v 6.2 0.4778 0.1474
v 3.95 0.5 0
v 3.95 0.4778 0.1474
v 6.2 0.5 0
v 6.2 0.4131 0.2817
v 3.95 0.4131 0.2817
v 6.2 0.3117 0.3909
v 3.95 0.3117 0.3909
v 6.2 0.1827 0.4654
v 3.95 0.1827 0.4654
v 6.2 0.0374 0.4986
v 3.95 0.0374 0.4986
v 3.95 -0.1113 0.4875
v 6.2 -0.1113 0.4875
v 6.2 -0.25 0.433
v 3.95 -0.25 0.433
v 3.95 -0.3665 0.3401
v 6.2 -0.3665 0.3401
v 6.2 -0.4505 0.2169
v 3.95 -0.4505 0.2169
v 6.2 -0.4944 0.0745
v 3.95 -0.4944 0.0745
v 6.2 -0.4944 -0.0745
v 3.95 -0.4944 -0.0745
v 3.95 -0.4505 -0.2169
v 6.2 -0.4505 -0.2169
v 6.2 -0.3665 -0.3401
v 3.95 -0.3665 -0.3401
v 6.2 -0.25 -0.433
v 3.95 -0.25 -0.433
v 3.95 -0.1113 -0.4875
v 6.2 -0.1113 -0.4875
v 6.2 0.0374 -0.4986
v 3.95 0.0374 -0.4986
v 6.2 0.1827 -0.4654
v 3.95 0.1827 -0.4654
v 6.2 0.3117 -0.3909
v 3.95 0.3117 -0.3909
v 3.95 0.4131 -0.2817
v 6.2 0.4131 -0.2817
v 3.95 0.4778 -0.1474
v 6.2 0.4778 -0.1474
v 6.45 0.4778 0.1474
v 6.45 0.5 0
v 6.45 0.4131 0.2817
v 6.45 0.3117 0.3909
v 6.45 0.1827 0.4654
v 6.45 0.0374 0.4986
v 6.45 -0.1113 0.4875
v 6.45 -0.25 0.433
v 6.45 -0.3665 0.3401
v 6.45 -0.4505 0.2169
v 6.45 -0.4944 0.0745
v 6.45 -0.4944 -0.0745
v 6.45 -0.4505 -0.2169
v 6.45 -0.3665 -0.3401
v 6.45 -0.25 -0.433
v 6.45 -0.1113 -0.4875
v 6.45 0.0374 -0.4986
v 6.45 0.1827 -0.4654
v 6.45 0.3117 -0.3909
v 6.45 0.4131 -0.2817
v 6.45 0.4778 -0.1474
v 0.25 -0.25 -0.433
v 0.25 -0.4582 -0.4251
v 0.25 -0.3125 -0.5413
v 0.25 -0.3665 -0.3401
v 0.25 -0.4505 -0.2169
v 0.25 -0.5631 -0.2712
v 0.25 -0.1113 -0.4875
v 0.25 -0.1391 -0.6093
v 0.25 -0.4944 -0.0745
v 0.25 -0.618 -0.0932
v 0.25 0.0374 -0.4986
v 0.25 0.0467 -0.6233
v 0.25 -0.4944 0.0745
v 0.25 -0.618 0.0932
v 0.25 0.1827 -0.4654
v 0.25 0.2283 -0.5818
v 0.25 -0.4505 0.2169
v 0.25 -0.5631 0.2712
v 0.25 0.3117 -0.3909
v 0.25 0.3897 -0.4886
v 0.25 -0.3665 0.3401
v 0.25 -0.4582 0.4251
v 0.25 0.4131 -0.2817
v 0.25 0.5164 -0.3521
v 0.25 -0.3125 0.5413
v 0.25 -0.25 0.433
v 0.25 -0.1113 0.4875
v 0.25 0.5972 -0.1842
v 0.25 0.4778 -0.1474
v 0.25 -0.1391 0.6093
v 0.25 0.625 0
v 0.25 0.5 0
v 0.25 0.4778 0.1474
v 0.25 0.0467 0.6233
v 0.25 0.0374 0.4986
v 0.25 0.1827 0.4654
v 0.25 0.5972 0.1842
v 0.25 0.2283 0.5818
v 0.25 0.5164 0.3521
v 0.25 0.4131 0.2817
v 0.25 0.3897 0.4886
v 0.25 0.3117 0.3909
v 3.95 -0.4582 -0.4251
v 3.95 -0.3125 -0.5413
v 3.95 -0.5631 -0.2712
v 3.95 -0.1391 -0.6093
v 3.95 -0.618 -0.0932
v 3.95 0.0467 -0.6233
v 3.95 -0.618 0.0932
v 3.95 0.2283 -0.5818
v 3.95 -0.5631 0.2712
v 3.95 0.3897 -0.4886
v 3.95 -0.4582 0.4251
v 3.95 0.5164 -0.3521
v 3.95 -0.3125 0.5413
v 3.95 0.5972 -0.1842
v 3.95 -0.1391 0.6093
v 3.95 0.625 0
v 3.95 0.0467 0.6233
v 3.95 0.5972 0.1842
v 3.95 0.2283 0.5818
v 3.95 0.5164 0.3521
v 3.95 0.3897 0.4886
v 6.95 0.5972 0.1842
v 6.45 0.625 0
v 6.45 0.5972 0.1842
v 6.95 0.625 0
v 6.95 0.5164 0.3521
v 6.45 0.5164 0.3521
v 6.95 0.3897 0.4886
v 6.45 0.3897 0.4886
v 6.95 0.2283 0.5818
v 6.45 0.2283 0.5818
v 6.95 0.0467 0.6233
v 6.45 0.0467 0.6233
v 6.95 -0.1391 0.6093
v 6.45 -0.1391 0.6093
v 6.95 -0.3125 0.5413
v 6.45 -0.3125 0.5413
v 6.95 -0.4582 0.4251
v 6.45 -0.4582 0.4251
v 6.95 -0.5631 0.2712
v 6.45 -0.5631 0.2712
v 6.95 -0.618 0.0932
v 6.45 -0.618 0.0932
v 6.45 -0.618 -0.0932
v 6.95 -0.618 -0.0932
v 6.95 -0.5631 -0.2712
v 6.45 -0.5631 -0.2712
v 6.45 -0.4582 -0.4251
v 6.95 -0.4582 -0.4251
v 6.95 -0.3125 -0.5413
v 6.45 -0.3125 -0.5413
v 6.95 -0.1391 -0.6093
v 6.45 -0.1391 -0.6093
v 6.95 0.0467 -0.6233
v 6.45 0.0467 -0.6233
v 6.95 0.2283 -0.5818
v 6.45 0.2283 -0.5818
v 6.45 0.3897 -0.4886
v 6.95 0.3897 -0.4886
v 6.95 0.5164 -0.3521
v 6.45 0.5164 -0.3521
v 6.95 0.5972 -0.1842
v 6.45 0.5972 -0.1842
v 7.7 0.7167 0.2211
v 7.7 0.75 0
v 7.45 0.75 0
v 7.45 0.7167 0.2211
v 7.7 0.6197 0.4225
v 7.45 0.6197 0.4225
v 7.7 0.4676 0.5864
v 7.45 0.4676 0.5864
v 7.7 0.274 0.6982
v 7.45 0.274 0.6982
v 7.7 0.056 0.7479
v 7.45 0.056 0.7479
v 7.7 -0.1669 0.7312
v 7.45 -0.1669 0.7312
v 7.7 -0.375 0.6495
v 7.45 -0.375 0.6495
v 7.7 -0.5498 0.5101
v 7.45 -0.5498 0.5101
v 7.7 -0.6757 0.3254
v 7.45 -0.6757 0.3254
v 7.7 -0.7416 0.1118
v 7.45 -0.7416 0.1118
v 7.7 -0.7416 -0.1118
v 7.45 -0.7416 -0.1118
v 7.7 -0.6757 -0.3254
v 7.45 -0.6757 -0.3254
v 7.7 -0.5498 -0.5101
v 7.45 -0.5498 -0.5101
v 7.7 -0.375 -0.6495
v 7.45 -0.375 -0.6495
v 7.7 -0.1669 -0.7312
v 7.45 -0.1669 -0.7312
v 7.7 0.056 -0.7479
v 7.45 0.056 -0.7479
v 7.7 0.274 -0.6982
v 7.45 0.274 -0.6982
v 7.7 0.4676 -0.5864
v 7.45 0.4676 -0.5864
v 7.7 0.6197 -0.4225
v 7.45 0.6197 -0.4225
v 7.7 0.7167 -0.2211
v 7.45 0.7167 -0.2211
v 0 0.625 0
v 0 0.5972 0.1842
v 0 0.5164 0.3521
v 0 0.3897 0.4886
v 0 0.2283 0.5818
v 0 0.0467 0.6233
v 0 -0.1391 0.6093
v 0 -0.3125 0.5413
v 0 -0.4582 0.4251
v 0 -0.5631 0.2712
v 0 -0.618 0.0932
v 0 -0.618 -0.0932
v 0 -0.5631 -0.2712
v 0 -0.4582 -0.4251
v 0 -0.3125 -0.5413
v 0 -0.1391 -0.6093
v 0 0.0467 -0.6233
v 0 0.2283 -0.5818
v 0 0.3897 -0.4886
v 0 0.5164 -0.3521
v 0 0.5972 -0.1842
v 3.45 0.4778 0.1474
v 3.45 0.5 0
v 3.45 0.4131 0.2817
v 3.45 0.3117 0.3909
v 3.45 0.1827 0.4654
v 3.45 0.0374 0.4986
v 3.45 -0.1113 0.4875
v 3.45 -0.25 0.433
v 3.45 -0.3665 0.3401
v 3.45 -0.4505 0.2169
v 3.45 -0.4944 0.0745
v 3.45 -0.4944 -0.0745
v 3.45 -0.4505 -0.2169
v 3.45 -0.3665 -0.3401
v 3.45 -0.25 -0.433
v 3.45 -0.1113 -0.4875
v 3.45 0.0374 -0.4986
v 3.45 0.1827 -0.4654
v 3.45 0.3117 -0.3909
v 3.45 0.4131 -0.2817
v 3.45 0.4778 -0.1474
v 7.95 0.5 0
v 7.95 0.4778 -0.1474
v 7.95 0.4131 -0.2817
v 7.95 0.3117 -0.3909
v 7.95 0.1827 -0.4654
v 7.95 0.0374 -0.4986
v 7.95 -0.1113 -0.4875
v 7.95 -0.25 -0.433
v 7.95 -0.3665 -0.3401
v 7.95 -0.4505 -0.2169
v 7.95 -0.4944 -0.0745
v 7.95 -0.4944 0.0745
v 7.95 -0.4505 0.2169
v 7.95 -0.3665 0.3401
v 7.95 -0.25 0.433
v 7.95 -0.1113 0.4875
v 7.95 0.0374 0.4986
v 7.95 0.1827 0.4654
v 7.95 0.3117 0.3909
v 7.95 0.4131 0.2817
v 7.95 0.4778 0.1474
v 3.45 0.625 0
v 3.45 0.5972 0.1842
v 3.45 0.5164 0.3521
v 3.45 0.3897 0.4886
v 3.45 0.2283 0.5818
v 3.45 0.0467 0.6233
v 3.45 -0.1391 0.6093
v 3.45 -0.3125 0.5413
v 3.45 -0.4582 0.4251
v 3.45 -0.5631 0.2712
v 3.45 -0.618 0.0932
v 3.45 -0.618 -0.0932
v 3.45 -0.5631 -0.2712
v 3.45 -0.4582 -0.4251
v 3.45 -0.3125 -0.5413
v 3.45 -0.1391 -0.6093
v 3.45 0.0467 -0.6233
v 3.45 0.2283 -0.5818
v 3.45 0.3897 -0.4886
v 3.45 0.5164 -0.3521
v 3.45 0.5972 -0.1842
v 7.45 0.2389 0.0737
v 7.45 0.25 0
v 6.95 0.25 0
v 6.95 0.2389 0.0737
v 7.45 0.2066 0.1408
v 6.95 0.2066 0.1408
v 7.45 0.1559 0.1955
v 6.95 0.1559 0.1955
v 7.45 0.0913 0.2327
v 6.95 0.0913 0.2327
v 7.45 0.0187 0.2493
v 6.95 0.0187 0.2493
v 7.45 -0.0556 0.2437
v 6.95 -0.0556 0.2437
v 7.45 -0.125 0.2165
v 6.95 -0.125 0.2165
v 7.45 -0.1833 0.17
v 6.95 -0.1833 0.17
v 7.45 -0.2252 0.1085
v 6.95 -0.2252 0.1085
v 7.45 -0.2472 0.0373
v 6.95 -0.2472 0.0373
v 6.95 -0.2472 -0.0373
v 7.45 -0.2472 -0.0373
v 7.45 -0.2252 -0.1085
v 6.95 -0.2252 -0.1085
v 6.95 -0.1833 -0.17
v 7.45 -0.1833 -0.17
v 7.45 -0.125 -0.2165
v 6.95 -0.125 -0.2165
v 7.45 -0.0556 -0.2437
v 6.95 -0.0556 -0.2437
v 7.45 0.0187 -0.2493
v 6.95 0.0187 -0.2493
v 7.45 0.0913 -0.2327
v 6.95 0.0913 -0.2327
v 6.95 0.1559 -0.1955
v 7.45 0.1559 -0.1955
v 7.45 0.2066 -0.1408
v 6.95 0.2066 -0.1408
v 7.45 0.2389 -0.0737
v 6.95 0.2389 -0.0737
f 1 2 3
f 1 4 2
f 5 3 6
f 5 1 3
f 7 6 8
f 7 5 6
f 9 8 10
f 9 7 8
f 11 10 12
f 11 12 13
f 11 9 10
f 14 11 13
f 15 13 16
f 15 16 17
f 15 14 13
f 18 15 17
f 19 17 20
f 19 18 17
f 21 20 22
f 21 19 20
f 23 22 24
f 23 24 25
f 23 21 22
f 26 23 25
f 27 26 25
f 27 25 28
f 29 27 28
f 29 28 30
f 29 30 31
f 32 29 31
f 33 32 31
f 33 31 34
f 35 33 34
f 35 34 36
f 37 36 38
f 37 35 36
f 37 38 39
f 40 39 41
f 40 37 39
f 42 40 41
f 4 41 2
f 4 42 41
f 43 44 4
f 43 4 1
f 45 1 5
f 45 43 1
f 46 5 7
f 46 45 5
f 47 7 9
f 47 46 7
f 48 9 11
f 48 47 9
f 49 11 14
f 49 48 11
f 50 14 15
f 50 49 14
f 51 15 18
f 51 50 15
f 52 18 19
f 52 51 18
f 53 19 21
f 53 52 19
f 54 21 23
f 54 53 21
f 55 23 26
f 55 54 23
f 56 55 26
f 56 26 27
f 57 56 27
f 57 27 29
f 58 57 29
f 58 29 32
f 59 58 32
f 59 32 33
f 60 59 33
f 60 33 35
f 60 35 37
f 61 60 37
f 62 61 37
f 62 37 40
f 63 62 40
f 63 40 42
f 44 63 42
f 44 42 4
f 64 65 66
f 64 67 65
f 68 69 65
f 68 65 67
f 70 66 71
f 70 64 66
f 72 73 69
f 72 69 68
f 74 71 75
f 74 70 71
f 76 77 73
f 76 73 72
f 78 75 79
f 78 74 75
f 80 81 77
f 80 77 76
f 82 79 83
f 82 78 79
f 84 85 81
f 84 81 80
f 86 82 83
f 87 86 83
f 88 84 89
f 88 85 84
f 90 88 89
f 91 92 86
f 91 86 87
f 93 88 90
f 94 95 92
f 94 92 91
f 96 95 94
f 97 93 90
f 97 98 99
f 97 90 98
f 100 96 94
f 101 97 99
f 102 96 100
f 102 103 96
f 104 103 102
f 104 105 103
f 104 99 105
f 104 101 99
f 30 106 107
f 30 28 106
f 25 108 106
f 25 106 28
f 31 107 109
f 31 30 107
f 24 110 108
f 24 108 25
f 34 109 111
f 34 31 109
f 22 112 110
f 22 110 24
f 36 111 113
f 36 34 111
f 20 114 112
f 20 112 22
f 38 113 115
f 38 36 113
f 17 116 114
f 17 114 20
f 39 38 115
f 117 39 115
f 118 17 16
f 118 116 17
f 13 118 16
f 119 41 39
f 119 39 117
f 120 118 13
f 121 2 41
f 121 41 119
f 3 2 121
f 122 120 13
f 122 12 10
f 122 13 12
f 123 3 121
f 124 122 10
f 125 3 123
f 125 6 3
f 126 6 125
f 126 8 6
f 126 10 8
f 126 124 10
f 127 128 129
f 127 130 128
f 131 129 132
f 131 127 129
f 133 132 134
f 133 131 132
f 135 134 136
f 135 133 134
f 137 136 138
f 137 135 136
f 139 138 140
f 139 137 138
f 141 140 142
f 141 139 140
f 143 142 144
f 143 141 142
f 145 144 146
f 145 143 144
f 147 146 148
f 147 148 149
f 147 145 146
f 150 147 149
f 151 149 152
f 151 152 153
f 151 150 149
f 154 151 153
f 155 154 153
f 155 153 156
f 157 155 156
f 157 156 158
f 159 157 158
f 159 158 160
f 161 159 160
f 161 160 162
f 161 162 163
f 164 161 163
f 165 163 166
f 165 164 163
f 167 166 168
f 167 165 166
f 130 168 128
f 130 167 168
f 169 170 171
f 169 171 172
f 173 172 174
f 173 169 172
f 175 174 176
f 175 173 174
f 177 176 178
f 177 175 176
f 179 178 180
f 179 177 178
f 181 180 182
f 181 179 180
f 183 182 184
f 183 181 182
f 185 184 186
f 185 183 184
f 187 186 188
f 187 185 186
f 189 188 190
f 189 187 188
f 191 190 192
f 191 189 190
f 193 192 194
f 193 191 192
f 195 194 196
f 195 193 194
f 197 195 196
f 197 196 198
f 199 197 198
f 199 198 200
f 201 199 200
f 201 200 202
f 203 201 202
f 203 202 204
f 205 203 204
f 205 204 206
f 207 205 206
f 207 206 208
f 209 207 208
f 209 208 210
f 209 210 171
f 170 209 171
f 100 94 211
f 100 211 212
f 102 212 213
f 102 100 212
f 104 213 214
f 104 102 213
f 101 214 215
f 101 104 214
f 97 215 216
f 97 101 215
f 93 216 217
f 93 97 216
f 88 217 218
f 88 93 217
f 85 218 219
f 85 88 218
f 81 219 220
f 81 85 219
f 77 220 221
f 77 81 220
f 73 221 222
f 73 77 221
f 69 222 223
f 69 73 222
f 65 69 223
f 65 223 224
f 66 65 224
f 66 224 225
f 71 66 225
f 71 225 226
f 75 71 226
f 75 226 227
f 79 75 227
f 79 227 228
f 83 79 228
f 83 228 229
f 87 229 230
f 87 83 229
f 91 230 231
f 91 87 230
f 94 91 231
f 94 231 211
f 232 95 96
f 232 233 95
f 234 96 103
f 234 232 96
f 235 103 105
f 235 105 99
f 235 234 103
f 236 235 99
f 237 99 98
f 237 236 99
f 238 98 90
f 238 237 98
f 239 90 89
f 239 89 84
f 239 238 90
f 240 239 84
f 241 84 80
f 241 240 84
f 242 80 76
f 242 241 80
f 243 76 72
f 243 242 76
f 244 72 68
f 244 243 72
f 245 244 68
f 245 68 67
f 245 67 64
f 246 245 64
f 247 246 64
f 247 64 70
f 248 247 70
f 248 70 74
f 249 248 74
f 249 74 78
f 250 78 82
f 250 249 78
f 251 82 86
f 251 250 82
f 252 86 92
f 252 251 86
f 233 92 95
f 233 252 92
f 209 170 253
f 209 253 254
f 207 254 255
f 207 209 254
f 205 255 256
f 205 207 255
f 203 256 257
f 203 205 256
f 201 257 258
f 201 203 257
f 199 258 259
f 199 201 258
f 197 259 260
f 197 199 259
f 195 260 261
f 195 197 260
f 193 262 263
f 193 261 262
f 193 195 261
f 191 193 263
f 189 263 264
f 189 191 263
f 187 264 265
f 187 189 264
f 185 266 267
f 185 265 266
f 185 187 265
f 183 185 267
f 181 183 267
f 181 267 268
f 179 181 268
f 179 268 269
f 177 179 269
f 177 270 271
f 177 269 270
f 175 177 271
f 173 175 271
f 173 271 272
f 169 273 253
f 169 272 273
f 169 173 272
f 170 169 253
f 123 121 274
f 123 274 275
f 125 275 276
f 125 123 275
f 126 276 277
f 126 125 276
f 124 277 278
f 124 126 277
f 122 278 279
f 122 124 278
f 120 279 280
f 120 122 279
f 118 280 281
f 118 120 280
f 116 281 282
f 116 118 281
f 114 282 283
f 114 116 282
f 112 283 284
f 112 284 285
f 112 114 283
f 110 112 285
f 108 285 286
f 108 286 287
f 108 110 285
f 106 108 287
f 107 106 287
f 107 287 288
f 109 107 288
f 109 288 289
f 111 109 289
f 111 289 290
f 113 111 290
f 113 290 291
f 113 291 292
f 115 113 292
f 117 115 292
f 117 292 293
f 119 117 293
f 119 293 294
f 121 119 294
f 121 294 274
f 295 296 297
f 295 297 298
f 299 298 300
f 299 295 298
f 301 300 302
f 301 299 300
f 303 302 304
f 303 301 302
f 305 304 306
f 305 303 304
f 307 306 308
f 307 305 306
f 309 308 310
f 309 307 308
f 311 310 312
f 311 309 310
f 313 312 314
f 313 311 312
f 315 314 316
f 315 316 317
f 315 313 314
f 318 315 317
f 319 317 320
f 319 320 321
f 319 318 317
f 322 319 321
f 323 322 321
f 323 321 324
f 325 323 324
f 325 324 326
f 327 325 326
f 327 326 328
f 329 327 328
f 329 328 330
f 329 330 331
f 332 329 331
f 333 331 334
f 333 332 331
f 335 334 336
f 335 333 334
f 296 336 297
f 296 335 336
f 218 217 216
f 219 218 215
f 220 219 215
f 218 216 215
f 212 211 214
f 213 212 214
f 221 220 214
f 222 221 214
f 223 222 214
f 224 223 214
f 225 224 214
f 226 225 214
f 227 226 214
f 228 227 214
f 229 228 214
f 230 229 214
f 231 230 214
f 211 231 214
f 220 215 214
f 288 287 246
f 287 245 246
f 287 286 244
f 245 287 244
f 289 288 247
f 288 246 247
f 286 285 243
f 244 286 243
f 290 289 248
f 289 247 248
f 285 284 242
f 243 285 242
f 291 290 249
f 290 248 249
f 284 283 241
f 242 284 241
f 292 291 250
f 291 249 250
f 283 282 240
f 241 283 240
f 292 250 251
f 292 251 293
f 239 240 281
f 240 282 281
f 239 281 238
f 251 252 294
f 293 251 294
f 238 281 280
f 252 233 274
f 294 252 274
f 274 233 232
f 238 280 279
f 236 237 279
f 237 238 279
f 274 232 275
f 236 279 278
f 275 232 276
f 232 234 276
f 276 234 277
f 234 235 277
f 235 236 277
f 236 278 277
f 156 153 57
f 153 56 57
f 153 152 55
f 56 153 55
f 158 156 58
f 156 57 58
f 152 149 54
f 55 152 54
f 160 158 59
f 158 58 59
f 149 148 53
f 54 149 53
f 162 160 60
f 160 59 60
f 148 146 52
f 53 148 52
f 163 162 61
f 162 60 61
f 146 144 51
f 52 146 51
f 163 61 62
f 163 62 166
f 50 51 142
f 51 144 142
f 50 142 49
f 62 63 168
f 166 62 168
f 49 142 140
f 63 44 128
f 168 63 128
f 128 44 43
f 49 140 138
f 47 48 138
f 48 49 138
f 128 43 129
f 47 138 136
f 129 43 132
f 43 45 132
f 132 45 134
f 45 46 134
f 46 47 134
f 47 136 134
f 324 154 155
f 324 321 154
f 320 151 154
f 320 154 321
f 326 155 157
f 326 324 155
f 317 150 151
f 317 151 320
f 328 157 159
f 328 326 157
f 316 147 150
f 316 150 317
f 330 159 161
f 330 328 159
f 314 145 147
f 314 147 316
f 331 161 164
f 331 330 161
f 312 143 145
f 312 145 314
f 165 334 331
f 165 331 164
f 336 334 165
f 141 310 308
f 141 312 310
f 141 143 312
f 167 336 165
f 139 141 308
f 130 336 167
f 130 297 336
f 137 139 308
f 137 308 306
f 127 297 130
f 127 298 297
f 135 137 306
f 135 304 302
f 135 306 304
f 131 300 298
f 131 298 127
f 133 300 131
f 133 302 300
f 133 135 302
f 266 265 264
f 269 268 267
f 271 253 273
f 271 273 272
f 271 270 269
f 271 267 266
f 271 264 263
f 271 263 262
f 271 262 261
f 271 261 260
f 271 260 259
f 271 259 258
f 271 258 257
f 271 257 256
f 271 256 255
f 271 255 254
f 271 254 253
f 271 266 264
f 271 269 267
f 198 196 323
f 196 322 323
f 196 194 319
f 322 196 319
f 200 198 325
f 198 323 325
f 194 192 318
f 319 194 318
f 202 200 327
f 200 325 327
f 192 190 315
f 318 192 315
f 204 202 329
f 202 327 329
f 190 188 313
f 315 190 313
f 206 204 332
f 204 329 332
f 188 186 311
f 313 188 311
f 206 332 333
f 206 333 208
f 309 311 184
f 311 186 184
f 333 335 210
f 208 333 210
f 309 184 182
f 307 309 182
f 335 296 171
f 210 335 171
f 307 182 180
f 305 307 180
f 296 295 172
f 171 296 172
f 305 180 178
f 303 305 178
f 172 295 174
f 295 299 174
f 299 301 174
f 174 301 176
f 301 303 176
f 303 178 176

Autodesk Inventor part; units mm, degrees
ref_plane "Start Plane" through (0, 0, 0) normal (1, 0, 0) x (0, 1, 0)
ref_plane "XZ Plane" through (0, 0, 0) normal (0, 1, 0) x (-1, 0, 0)
ref_plane "XY Plane" through (0, 0, 0) normal (0, 0, 1) x (1, 0, 0)
sketch "Main Sketch" plane through (0, 0, 0) normal (0, 0, 1) x (1, 0, 0)
  line L0 (0, 0) -> (7.95, 0)
  line L1 (0, 0) -> (0, 0.625)
  line L2 (3.45, 0.5) -> (3.45, 0.625)
  line L3 (0, 0.625) -> (0.25, 0.625)
  line L4 (3.95, 0.625) -> (3.95, 0.5)
  line L5 (3.45, 0.625) -> (3.95, 0.625)
  line L6 (7.45, 0.25) -> (7.45, 0.75)
  line L7 (6.95, 0.25) -> (7.45, 0.25)
  line L8 (7.95, 0.75) -> (7.95, 0)
  line L9 (7.45, 0.75) -> (7.95, 0.75)
  line L10 (0.25, 0.625) -> (0.25, 0.5)
  line L11 (0.25, 0.5) -> (3.45, 0.5)
  line L12 (3.7, 0.375) -> (6.2, 0.375)
  line L13 (6.2, 0.375) -> (6.2, 0.5)
  line L14 (6.7, 0.5) -> (6.7, 0.25)
  line L15 (6.2, 0.5) -> (6.7, 0.5)
  line L16 (3.95, 0.5) -> (6.45, 0.5)
  line L17 (6.45, 0.5) -> (6.45, 0.625)
  line L18 (6.95, 0.625) -> (6.95, 0.25)
  line L19 (6.45, 0.625) -> (6.95, 0.625)
  dimension "d3" = 1.25
  dimension "d6" = 1.25
  dimension "d7" = 0.5
  dimension "d10" = 1.5
  dimension "d15" = 1
  dimension "d22" = 0.75
  dimension "d23" = 1
  dimension "d24" = 1
  dimension "d25" = 1.25
revolve "Revolution1" add sketch "Main Sketch" angle 360 about axis through (0, 0, 0) along (1, 0, 0)
chamfer "Chamfer3" [suppressed]
chamfer "Chamfer1" distance 0.25 angle 45 1 edges at (7.95, -0.75, 0) measured on face at (7.6167, 0.7476, -0.0603)
equation "\"Length\" = 7.95"
properties part number "Shaft" material "Steel"
